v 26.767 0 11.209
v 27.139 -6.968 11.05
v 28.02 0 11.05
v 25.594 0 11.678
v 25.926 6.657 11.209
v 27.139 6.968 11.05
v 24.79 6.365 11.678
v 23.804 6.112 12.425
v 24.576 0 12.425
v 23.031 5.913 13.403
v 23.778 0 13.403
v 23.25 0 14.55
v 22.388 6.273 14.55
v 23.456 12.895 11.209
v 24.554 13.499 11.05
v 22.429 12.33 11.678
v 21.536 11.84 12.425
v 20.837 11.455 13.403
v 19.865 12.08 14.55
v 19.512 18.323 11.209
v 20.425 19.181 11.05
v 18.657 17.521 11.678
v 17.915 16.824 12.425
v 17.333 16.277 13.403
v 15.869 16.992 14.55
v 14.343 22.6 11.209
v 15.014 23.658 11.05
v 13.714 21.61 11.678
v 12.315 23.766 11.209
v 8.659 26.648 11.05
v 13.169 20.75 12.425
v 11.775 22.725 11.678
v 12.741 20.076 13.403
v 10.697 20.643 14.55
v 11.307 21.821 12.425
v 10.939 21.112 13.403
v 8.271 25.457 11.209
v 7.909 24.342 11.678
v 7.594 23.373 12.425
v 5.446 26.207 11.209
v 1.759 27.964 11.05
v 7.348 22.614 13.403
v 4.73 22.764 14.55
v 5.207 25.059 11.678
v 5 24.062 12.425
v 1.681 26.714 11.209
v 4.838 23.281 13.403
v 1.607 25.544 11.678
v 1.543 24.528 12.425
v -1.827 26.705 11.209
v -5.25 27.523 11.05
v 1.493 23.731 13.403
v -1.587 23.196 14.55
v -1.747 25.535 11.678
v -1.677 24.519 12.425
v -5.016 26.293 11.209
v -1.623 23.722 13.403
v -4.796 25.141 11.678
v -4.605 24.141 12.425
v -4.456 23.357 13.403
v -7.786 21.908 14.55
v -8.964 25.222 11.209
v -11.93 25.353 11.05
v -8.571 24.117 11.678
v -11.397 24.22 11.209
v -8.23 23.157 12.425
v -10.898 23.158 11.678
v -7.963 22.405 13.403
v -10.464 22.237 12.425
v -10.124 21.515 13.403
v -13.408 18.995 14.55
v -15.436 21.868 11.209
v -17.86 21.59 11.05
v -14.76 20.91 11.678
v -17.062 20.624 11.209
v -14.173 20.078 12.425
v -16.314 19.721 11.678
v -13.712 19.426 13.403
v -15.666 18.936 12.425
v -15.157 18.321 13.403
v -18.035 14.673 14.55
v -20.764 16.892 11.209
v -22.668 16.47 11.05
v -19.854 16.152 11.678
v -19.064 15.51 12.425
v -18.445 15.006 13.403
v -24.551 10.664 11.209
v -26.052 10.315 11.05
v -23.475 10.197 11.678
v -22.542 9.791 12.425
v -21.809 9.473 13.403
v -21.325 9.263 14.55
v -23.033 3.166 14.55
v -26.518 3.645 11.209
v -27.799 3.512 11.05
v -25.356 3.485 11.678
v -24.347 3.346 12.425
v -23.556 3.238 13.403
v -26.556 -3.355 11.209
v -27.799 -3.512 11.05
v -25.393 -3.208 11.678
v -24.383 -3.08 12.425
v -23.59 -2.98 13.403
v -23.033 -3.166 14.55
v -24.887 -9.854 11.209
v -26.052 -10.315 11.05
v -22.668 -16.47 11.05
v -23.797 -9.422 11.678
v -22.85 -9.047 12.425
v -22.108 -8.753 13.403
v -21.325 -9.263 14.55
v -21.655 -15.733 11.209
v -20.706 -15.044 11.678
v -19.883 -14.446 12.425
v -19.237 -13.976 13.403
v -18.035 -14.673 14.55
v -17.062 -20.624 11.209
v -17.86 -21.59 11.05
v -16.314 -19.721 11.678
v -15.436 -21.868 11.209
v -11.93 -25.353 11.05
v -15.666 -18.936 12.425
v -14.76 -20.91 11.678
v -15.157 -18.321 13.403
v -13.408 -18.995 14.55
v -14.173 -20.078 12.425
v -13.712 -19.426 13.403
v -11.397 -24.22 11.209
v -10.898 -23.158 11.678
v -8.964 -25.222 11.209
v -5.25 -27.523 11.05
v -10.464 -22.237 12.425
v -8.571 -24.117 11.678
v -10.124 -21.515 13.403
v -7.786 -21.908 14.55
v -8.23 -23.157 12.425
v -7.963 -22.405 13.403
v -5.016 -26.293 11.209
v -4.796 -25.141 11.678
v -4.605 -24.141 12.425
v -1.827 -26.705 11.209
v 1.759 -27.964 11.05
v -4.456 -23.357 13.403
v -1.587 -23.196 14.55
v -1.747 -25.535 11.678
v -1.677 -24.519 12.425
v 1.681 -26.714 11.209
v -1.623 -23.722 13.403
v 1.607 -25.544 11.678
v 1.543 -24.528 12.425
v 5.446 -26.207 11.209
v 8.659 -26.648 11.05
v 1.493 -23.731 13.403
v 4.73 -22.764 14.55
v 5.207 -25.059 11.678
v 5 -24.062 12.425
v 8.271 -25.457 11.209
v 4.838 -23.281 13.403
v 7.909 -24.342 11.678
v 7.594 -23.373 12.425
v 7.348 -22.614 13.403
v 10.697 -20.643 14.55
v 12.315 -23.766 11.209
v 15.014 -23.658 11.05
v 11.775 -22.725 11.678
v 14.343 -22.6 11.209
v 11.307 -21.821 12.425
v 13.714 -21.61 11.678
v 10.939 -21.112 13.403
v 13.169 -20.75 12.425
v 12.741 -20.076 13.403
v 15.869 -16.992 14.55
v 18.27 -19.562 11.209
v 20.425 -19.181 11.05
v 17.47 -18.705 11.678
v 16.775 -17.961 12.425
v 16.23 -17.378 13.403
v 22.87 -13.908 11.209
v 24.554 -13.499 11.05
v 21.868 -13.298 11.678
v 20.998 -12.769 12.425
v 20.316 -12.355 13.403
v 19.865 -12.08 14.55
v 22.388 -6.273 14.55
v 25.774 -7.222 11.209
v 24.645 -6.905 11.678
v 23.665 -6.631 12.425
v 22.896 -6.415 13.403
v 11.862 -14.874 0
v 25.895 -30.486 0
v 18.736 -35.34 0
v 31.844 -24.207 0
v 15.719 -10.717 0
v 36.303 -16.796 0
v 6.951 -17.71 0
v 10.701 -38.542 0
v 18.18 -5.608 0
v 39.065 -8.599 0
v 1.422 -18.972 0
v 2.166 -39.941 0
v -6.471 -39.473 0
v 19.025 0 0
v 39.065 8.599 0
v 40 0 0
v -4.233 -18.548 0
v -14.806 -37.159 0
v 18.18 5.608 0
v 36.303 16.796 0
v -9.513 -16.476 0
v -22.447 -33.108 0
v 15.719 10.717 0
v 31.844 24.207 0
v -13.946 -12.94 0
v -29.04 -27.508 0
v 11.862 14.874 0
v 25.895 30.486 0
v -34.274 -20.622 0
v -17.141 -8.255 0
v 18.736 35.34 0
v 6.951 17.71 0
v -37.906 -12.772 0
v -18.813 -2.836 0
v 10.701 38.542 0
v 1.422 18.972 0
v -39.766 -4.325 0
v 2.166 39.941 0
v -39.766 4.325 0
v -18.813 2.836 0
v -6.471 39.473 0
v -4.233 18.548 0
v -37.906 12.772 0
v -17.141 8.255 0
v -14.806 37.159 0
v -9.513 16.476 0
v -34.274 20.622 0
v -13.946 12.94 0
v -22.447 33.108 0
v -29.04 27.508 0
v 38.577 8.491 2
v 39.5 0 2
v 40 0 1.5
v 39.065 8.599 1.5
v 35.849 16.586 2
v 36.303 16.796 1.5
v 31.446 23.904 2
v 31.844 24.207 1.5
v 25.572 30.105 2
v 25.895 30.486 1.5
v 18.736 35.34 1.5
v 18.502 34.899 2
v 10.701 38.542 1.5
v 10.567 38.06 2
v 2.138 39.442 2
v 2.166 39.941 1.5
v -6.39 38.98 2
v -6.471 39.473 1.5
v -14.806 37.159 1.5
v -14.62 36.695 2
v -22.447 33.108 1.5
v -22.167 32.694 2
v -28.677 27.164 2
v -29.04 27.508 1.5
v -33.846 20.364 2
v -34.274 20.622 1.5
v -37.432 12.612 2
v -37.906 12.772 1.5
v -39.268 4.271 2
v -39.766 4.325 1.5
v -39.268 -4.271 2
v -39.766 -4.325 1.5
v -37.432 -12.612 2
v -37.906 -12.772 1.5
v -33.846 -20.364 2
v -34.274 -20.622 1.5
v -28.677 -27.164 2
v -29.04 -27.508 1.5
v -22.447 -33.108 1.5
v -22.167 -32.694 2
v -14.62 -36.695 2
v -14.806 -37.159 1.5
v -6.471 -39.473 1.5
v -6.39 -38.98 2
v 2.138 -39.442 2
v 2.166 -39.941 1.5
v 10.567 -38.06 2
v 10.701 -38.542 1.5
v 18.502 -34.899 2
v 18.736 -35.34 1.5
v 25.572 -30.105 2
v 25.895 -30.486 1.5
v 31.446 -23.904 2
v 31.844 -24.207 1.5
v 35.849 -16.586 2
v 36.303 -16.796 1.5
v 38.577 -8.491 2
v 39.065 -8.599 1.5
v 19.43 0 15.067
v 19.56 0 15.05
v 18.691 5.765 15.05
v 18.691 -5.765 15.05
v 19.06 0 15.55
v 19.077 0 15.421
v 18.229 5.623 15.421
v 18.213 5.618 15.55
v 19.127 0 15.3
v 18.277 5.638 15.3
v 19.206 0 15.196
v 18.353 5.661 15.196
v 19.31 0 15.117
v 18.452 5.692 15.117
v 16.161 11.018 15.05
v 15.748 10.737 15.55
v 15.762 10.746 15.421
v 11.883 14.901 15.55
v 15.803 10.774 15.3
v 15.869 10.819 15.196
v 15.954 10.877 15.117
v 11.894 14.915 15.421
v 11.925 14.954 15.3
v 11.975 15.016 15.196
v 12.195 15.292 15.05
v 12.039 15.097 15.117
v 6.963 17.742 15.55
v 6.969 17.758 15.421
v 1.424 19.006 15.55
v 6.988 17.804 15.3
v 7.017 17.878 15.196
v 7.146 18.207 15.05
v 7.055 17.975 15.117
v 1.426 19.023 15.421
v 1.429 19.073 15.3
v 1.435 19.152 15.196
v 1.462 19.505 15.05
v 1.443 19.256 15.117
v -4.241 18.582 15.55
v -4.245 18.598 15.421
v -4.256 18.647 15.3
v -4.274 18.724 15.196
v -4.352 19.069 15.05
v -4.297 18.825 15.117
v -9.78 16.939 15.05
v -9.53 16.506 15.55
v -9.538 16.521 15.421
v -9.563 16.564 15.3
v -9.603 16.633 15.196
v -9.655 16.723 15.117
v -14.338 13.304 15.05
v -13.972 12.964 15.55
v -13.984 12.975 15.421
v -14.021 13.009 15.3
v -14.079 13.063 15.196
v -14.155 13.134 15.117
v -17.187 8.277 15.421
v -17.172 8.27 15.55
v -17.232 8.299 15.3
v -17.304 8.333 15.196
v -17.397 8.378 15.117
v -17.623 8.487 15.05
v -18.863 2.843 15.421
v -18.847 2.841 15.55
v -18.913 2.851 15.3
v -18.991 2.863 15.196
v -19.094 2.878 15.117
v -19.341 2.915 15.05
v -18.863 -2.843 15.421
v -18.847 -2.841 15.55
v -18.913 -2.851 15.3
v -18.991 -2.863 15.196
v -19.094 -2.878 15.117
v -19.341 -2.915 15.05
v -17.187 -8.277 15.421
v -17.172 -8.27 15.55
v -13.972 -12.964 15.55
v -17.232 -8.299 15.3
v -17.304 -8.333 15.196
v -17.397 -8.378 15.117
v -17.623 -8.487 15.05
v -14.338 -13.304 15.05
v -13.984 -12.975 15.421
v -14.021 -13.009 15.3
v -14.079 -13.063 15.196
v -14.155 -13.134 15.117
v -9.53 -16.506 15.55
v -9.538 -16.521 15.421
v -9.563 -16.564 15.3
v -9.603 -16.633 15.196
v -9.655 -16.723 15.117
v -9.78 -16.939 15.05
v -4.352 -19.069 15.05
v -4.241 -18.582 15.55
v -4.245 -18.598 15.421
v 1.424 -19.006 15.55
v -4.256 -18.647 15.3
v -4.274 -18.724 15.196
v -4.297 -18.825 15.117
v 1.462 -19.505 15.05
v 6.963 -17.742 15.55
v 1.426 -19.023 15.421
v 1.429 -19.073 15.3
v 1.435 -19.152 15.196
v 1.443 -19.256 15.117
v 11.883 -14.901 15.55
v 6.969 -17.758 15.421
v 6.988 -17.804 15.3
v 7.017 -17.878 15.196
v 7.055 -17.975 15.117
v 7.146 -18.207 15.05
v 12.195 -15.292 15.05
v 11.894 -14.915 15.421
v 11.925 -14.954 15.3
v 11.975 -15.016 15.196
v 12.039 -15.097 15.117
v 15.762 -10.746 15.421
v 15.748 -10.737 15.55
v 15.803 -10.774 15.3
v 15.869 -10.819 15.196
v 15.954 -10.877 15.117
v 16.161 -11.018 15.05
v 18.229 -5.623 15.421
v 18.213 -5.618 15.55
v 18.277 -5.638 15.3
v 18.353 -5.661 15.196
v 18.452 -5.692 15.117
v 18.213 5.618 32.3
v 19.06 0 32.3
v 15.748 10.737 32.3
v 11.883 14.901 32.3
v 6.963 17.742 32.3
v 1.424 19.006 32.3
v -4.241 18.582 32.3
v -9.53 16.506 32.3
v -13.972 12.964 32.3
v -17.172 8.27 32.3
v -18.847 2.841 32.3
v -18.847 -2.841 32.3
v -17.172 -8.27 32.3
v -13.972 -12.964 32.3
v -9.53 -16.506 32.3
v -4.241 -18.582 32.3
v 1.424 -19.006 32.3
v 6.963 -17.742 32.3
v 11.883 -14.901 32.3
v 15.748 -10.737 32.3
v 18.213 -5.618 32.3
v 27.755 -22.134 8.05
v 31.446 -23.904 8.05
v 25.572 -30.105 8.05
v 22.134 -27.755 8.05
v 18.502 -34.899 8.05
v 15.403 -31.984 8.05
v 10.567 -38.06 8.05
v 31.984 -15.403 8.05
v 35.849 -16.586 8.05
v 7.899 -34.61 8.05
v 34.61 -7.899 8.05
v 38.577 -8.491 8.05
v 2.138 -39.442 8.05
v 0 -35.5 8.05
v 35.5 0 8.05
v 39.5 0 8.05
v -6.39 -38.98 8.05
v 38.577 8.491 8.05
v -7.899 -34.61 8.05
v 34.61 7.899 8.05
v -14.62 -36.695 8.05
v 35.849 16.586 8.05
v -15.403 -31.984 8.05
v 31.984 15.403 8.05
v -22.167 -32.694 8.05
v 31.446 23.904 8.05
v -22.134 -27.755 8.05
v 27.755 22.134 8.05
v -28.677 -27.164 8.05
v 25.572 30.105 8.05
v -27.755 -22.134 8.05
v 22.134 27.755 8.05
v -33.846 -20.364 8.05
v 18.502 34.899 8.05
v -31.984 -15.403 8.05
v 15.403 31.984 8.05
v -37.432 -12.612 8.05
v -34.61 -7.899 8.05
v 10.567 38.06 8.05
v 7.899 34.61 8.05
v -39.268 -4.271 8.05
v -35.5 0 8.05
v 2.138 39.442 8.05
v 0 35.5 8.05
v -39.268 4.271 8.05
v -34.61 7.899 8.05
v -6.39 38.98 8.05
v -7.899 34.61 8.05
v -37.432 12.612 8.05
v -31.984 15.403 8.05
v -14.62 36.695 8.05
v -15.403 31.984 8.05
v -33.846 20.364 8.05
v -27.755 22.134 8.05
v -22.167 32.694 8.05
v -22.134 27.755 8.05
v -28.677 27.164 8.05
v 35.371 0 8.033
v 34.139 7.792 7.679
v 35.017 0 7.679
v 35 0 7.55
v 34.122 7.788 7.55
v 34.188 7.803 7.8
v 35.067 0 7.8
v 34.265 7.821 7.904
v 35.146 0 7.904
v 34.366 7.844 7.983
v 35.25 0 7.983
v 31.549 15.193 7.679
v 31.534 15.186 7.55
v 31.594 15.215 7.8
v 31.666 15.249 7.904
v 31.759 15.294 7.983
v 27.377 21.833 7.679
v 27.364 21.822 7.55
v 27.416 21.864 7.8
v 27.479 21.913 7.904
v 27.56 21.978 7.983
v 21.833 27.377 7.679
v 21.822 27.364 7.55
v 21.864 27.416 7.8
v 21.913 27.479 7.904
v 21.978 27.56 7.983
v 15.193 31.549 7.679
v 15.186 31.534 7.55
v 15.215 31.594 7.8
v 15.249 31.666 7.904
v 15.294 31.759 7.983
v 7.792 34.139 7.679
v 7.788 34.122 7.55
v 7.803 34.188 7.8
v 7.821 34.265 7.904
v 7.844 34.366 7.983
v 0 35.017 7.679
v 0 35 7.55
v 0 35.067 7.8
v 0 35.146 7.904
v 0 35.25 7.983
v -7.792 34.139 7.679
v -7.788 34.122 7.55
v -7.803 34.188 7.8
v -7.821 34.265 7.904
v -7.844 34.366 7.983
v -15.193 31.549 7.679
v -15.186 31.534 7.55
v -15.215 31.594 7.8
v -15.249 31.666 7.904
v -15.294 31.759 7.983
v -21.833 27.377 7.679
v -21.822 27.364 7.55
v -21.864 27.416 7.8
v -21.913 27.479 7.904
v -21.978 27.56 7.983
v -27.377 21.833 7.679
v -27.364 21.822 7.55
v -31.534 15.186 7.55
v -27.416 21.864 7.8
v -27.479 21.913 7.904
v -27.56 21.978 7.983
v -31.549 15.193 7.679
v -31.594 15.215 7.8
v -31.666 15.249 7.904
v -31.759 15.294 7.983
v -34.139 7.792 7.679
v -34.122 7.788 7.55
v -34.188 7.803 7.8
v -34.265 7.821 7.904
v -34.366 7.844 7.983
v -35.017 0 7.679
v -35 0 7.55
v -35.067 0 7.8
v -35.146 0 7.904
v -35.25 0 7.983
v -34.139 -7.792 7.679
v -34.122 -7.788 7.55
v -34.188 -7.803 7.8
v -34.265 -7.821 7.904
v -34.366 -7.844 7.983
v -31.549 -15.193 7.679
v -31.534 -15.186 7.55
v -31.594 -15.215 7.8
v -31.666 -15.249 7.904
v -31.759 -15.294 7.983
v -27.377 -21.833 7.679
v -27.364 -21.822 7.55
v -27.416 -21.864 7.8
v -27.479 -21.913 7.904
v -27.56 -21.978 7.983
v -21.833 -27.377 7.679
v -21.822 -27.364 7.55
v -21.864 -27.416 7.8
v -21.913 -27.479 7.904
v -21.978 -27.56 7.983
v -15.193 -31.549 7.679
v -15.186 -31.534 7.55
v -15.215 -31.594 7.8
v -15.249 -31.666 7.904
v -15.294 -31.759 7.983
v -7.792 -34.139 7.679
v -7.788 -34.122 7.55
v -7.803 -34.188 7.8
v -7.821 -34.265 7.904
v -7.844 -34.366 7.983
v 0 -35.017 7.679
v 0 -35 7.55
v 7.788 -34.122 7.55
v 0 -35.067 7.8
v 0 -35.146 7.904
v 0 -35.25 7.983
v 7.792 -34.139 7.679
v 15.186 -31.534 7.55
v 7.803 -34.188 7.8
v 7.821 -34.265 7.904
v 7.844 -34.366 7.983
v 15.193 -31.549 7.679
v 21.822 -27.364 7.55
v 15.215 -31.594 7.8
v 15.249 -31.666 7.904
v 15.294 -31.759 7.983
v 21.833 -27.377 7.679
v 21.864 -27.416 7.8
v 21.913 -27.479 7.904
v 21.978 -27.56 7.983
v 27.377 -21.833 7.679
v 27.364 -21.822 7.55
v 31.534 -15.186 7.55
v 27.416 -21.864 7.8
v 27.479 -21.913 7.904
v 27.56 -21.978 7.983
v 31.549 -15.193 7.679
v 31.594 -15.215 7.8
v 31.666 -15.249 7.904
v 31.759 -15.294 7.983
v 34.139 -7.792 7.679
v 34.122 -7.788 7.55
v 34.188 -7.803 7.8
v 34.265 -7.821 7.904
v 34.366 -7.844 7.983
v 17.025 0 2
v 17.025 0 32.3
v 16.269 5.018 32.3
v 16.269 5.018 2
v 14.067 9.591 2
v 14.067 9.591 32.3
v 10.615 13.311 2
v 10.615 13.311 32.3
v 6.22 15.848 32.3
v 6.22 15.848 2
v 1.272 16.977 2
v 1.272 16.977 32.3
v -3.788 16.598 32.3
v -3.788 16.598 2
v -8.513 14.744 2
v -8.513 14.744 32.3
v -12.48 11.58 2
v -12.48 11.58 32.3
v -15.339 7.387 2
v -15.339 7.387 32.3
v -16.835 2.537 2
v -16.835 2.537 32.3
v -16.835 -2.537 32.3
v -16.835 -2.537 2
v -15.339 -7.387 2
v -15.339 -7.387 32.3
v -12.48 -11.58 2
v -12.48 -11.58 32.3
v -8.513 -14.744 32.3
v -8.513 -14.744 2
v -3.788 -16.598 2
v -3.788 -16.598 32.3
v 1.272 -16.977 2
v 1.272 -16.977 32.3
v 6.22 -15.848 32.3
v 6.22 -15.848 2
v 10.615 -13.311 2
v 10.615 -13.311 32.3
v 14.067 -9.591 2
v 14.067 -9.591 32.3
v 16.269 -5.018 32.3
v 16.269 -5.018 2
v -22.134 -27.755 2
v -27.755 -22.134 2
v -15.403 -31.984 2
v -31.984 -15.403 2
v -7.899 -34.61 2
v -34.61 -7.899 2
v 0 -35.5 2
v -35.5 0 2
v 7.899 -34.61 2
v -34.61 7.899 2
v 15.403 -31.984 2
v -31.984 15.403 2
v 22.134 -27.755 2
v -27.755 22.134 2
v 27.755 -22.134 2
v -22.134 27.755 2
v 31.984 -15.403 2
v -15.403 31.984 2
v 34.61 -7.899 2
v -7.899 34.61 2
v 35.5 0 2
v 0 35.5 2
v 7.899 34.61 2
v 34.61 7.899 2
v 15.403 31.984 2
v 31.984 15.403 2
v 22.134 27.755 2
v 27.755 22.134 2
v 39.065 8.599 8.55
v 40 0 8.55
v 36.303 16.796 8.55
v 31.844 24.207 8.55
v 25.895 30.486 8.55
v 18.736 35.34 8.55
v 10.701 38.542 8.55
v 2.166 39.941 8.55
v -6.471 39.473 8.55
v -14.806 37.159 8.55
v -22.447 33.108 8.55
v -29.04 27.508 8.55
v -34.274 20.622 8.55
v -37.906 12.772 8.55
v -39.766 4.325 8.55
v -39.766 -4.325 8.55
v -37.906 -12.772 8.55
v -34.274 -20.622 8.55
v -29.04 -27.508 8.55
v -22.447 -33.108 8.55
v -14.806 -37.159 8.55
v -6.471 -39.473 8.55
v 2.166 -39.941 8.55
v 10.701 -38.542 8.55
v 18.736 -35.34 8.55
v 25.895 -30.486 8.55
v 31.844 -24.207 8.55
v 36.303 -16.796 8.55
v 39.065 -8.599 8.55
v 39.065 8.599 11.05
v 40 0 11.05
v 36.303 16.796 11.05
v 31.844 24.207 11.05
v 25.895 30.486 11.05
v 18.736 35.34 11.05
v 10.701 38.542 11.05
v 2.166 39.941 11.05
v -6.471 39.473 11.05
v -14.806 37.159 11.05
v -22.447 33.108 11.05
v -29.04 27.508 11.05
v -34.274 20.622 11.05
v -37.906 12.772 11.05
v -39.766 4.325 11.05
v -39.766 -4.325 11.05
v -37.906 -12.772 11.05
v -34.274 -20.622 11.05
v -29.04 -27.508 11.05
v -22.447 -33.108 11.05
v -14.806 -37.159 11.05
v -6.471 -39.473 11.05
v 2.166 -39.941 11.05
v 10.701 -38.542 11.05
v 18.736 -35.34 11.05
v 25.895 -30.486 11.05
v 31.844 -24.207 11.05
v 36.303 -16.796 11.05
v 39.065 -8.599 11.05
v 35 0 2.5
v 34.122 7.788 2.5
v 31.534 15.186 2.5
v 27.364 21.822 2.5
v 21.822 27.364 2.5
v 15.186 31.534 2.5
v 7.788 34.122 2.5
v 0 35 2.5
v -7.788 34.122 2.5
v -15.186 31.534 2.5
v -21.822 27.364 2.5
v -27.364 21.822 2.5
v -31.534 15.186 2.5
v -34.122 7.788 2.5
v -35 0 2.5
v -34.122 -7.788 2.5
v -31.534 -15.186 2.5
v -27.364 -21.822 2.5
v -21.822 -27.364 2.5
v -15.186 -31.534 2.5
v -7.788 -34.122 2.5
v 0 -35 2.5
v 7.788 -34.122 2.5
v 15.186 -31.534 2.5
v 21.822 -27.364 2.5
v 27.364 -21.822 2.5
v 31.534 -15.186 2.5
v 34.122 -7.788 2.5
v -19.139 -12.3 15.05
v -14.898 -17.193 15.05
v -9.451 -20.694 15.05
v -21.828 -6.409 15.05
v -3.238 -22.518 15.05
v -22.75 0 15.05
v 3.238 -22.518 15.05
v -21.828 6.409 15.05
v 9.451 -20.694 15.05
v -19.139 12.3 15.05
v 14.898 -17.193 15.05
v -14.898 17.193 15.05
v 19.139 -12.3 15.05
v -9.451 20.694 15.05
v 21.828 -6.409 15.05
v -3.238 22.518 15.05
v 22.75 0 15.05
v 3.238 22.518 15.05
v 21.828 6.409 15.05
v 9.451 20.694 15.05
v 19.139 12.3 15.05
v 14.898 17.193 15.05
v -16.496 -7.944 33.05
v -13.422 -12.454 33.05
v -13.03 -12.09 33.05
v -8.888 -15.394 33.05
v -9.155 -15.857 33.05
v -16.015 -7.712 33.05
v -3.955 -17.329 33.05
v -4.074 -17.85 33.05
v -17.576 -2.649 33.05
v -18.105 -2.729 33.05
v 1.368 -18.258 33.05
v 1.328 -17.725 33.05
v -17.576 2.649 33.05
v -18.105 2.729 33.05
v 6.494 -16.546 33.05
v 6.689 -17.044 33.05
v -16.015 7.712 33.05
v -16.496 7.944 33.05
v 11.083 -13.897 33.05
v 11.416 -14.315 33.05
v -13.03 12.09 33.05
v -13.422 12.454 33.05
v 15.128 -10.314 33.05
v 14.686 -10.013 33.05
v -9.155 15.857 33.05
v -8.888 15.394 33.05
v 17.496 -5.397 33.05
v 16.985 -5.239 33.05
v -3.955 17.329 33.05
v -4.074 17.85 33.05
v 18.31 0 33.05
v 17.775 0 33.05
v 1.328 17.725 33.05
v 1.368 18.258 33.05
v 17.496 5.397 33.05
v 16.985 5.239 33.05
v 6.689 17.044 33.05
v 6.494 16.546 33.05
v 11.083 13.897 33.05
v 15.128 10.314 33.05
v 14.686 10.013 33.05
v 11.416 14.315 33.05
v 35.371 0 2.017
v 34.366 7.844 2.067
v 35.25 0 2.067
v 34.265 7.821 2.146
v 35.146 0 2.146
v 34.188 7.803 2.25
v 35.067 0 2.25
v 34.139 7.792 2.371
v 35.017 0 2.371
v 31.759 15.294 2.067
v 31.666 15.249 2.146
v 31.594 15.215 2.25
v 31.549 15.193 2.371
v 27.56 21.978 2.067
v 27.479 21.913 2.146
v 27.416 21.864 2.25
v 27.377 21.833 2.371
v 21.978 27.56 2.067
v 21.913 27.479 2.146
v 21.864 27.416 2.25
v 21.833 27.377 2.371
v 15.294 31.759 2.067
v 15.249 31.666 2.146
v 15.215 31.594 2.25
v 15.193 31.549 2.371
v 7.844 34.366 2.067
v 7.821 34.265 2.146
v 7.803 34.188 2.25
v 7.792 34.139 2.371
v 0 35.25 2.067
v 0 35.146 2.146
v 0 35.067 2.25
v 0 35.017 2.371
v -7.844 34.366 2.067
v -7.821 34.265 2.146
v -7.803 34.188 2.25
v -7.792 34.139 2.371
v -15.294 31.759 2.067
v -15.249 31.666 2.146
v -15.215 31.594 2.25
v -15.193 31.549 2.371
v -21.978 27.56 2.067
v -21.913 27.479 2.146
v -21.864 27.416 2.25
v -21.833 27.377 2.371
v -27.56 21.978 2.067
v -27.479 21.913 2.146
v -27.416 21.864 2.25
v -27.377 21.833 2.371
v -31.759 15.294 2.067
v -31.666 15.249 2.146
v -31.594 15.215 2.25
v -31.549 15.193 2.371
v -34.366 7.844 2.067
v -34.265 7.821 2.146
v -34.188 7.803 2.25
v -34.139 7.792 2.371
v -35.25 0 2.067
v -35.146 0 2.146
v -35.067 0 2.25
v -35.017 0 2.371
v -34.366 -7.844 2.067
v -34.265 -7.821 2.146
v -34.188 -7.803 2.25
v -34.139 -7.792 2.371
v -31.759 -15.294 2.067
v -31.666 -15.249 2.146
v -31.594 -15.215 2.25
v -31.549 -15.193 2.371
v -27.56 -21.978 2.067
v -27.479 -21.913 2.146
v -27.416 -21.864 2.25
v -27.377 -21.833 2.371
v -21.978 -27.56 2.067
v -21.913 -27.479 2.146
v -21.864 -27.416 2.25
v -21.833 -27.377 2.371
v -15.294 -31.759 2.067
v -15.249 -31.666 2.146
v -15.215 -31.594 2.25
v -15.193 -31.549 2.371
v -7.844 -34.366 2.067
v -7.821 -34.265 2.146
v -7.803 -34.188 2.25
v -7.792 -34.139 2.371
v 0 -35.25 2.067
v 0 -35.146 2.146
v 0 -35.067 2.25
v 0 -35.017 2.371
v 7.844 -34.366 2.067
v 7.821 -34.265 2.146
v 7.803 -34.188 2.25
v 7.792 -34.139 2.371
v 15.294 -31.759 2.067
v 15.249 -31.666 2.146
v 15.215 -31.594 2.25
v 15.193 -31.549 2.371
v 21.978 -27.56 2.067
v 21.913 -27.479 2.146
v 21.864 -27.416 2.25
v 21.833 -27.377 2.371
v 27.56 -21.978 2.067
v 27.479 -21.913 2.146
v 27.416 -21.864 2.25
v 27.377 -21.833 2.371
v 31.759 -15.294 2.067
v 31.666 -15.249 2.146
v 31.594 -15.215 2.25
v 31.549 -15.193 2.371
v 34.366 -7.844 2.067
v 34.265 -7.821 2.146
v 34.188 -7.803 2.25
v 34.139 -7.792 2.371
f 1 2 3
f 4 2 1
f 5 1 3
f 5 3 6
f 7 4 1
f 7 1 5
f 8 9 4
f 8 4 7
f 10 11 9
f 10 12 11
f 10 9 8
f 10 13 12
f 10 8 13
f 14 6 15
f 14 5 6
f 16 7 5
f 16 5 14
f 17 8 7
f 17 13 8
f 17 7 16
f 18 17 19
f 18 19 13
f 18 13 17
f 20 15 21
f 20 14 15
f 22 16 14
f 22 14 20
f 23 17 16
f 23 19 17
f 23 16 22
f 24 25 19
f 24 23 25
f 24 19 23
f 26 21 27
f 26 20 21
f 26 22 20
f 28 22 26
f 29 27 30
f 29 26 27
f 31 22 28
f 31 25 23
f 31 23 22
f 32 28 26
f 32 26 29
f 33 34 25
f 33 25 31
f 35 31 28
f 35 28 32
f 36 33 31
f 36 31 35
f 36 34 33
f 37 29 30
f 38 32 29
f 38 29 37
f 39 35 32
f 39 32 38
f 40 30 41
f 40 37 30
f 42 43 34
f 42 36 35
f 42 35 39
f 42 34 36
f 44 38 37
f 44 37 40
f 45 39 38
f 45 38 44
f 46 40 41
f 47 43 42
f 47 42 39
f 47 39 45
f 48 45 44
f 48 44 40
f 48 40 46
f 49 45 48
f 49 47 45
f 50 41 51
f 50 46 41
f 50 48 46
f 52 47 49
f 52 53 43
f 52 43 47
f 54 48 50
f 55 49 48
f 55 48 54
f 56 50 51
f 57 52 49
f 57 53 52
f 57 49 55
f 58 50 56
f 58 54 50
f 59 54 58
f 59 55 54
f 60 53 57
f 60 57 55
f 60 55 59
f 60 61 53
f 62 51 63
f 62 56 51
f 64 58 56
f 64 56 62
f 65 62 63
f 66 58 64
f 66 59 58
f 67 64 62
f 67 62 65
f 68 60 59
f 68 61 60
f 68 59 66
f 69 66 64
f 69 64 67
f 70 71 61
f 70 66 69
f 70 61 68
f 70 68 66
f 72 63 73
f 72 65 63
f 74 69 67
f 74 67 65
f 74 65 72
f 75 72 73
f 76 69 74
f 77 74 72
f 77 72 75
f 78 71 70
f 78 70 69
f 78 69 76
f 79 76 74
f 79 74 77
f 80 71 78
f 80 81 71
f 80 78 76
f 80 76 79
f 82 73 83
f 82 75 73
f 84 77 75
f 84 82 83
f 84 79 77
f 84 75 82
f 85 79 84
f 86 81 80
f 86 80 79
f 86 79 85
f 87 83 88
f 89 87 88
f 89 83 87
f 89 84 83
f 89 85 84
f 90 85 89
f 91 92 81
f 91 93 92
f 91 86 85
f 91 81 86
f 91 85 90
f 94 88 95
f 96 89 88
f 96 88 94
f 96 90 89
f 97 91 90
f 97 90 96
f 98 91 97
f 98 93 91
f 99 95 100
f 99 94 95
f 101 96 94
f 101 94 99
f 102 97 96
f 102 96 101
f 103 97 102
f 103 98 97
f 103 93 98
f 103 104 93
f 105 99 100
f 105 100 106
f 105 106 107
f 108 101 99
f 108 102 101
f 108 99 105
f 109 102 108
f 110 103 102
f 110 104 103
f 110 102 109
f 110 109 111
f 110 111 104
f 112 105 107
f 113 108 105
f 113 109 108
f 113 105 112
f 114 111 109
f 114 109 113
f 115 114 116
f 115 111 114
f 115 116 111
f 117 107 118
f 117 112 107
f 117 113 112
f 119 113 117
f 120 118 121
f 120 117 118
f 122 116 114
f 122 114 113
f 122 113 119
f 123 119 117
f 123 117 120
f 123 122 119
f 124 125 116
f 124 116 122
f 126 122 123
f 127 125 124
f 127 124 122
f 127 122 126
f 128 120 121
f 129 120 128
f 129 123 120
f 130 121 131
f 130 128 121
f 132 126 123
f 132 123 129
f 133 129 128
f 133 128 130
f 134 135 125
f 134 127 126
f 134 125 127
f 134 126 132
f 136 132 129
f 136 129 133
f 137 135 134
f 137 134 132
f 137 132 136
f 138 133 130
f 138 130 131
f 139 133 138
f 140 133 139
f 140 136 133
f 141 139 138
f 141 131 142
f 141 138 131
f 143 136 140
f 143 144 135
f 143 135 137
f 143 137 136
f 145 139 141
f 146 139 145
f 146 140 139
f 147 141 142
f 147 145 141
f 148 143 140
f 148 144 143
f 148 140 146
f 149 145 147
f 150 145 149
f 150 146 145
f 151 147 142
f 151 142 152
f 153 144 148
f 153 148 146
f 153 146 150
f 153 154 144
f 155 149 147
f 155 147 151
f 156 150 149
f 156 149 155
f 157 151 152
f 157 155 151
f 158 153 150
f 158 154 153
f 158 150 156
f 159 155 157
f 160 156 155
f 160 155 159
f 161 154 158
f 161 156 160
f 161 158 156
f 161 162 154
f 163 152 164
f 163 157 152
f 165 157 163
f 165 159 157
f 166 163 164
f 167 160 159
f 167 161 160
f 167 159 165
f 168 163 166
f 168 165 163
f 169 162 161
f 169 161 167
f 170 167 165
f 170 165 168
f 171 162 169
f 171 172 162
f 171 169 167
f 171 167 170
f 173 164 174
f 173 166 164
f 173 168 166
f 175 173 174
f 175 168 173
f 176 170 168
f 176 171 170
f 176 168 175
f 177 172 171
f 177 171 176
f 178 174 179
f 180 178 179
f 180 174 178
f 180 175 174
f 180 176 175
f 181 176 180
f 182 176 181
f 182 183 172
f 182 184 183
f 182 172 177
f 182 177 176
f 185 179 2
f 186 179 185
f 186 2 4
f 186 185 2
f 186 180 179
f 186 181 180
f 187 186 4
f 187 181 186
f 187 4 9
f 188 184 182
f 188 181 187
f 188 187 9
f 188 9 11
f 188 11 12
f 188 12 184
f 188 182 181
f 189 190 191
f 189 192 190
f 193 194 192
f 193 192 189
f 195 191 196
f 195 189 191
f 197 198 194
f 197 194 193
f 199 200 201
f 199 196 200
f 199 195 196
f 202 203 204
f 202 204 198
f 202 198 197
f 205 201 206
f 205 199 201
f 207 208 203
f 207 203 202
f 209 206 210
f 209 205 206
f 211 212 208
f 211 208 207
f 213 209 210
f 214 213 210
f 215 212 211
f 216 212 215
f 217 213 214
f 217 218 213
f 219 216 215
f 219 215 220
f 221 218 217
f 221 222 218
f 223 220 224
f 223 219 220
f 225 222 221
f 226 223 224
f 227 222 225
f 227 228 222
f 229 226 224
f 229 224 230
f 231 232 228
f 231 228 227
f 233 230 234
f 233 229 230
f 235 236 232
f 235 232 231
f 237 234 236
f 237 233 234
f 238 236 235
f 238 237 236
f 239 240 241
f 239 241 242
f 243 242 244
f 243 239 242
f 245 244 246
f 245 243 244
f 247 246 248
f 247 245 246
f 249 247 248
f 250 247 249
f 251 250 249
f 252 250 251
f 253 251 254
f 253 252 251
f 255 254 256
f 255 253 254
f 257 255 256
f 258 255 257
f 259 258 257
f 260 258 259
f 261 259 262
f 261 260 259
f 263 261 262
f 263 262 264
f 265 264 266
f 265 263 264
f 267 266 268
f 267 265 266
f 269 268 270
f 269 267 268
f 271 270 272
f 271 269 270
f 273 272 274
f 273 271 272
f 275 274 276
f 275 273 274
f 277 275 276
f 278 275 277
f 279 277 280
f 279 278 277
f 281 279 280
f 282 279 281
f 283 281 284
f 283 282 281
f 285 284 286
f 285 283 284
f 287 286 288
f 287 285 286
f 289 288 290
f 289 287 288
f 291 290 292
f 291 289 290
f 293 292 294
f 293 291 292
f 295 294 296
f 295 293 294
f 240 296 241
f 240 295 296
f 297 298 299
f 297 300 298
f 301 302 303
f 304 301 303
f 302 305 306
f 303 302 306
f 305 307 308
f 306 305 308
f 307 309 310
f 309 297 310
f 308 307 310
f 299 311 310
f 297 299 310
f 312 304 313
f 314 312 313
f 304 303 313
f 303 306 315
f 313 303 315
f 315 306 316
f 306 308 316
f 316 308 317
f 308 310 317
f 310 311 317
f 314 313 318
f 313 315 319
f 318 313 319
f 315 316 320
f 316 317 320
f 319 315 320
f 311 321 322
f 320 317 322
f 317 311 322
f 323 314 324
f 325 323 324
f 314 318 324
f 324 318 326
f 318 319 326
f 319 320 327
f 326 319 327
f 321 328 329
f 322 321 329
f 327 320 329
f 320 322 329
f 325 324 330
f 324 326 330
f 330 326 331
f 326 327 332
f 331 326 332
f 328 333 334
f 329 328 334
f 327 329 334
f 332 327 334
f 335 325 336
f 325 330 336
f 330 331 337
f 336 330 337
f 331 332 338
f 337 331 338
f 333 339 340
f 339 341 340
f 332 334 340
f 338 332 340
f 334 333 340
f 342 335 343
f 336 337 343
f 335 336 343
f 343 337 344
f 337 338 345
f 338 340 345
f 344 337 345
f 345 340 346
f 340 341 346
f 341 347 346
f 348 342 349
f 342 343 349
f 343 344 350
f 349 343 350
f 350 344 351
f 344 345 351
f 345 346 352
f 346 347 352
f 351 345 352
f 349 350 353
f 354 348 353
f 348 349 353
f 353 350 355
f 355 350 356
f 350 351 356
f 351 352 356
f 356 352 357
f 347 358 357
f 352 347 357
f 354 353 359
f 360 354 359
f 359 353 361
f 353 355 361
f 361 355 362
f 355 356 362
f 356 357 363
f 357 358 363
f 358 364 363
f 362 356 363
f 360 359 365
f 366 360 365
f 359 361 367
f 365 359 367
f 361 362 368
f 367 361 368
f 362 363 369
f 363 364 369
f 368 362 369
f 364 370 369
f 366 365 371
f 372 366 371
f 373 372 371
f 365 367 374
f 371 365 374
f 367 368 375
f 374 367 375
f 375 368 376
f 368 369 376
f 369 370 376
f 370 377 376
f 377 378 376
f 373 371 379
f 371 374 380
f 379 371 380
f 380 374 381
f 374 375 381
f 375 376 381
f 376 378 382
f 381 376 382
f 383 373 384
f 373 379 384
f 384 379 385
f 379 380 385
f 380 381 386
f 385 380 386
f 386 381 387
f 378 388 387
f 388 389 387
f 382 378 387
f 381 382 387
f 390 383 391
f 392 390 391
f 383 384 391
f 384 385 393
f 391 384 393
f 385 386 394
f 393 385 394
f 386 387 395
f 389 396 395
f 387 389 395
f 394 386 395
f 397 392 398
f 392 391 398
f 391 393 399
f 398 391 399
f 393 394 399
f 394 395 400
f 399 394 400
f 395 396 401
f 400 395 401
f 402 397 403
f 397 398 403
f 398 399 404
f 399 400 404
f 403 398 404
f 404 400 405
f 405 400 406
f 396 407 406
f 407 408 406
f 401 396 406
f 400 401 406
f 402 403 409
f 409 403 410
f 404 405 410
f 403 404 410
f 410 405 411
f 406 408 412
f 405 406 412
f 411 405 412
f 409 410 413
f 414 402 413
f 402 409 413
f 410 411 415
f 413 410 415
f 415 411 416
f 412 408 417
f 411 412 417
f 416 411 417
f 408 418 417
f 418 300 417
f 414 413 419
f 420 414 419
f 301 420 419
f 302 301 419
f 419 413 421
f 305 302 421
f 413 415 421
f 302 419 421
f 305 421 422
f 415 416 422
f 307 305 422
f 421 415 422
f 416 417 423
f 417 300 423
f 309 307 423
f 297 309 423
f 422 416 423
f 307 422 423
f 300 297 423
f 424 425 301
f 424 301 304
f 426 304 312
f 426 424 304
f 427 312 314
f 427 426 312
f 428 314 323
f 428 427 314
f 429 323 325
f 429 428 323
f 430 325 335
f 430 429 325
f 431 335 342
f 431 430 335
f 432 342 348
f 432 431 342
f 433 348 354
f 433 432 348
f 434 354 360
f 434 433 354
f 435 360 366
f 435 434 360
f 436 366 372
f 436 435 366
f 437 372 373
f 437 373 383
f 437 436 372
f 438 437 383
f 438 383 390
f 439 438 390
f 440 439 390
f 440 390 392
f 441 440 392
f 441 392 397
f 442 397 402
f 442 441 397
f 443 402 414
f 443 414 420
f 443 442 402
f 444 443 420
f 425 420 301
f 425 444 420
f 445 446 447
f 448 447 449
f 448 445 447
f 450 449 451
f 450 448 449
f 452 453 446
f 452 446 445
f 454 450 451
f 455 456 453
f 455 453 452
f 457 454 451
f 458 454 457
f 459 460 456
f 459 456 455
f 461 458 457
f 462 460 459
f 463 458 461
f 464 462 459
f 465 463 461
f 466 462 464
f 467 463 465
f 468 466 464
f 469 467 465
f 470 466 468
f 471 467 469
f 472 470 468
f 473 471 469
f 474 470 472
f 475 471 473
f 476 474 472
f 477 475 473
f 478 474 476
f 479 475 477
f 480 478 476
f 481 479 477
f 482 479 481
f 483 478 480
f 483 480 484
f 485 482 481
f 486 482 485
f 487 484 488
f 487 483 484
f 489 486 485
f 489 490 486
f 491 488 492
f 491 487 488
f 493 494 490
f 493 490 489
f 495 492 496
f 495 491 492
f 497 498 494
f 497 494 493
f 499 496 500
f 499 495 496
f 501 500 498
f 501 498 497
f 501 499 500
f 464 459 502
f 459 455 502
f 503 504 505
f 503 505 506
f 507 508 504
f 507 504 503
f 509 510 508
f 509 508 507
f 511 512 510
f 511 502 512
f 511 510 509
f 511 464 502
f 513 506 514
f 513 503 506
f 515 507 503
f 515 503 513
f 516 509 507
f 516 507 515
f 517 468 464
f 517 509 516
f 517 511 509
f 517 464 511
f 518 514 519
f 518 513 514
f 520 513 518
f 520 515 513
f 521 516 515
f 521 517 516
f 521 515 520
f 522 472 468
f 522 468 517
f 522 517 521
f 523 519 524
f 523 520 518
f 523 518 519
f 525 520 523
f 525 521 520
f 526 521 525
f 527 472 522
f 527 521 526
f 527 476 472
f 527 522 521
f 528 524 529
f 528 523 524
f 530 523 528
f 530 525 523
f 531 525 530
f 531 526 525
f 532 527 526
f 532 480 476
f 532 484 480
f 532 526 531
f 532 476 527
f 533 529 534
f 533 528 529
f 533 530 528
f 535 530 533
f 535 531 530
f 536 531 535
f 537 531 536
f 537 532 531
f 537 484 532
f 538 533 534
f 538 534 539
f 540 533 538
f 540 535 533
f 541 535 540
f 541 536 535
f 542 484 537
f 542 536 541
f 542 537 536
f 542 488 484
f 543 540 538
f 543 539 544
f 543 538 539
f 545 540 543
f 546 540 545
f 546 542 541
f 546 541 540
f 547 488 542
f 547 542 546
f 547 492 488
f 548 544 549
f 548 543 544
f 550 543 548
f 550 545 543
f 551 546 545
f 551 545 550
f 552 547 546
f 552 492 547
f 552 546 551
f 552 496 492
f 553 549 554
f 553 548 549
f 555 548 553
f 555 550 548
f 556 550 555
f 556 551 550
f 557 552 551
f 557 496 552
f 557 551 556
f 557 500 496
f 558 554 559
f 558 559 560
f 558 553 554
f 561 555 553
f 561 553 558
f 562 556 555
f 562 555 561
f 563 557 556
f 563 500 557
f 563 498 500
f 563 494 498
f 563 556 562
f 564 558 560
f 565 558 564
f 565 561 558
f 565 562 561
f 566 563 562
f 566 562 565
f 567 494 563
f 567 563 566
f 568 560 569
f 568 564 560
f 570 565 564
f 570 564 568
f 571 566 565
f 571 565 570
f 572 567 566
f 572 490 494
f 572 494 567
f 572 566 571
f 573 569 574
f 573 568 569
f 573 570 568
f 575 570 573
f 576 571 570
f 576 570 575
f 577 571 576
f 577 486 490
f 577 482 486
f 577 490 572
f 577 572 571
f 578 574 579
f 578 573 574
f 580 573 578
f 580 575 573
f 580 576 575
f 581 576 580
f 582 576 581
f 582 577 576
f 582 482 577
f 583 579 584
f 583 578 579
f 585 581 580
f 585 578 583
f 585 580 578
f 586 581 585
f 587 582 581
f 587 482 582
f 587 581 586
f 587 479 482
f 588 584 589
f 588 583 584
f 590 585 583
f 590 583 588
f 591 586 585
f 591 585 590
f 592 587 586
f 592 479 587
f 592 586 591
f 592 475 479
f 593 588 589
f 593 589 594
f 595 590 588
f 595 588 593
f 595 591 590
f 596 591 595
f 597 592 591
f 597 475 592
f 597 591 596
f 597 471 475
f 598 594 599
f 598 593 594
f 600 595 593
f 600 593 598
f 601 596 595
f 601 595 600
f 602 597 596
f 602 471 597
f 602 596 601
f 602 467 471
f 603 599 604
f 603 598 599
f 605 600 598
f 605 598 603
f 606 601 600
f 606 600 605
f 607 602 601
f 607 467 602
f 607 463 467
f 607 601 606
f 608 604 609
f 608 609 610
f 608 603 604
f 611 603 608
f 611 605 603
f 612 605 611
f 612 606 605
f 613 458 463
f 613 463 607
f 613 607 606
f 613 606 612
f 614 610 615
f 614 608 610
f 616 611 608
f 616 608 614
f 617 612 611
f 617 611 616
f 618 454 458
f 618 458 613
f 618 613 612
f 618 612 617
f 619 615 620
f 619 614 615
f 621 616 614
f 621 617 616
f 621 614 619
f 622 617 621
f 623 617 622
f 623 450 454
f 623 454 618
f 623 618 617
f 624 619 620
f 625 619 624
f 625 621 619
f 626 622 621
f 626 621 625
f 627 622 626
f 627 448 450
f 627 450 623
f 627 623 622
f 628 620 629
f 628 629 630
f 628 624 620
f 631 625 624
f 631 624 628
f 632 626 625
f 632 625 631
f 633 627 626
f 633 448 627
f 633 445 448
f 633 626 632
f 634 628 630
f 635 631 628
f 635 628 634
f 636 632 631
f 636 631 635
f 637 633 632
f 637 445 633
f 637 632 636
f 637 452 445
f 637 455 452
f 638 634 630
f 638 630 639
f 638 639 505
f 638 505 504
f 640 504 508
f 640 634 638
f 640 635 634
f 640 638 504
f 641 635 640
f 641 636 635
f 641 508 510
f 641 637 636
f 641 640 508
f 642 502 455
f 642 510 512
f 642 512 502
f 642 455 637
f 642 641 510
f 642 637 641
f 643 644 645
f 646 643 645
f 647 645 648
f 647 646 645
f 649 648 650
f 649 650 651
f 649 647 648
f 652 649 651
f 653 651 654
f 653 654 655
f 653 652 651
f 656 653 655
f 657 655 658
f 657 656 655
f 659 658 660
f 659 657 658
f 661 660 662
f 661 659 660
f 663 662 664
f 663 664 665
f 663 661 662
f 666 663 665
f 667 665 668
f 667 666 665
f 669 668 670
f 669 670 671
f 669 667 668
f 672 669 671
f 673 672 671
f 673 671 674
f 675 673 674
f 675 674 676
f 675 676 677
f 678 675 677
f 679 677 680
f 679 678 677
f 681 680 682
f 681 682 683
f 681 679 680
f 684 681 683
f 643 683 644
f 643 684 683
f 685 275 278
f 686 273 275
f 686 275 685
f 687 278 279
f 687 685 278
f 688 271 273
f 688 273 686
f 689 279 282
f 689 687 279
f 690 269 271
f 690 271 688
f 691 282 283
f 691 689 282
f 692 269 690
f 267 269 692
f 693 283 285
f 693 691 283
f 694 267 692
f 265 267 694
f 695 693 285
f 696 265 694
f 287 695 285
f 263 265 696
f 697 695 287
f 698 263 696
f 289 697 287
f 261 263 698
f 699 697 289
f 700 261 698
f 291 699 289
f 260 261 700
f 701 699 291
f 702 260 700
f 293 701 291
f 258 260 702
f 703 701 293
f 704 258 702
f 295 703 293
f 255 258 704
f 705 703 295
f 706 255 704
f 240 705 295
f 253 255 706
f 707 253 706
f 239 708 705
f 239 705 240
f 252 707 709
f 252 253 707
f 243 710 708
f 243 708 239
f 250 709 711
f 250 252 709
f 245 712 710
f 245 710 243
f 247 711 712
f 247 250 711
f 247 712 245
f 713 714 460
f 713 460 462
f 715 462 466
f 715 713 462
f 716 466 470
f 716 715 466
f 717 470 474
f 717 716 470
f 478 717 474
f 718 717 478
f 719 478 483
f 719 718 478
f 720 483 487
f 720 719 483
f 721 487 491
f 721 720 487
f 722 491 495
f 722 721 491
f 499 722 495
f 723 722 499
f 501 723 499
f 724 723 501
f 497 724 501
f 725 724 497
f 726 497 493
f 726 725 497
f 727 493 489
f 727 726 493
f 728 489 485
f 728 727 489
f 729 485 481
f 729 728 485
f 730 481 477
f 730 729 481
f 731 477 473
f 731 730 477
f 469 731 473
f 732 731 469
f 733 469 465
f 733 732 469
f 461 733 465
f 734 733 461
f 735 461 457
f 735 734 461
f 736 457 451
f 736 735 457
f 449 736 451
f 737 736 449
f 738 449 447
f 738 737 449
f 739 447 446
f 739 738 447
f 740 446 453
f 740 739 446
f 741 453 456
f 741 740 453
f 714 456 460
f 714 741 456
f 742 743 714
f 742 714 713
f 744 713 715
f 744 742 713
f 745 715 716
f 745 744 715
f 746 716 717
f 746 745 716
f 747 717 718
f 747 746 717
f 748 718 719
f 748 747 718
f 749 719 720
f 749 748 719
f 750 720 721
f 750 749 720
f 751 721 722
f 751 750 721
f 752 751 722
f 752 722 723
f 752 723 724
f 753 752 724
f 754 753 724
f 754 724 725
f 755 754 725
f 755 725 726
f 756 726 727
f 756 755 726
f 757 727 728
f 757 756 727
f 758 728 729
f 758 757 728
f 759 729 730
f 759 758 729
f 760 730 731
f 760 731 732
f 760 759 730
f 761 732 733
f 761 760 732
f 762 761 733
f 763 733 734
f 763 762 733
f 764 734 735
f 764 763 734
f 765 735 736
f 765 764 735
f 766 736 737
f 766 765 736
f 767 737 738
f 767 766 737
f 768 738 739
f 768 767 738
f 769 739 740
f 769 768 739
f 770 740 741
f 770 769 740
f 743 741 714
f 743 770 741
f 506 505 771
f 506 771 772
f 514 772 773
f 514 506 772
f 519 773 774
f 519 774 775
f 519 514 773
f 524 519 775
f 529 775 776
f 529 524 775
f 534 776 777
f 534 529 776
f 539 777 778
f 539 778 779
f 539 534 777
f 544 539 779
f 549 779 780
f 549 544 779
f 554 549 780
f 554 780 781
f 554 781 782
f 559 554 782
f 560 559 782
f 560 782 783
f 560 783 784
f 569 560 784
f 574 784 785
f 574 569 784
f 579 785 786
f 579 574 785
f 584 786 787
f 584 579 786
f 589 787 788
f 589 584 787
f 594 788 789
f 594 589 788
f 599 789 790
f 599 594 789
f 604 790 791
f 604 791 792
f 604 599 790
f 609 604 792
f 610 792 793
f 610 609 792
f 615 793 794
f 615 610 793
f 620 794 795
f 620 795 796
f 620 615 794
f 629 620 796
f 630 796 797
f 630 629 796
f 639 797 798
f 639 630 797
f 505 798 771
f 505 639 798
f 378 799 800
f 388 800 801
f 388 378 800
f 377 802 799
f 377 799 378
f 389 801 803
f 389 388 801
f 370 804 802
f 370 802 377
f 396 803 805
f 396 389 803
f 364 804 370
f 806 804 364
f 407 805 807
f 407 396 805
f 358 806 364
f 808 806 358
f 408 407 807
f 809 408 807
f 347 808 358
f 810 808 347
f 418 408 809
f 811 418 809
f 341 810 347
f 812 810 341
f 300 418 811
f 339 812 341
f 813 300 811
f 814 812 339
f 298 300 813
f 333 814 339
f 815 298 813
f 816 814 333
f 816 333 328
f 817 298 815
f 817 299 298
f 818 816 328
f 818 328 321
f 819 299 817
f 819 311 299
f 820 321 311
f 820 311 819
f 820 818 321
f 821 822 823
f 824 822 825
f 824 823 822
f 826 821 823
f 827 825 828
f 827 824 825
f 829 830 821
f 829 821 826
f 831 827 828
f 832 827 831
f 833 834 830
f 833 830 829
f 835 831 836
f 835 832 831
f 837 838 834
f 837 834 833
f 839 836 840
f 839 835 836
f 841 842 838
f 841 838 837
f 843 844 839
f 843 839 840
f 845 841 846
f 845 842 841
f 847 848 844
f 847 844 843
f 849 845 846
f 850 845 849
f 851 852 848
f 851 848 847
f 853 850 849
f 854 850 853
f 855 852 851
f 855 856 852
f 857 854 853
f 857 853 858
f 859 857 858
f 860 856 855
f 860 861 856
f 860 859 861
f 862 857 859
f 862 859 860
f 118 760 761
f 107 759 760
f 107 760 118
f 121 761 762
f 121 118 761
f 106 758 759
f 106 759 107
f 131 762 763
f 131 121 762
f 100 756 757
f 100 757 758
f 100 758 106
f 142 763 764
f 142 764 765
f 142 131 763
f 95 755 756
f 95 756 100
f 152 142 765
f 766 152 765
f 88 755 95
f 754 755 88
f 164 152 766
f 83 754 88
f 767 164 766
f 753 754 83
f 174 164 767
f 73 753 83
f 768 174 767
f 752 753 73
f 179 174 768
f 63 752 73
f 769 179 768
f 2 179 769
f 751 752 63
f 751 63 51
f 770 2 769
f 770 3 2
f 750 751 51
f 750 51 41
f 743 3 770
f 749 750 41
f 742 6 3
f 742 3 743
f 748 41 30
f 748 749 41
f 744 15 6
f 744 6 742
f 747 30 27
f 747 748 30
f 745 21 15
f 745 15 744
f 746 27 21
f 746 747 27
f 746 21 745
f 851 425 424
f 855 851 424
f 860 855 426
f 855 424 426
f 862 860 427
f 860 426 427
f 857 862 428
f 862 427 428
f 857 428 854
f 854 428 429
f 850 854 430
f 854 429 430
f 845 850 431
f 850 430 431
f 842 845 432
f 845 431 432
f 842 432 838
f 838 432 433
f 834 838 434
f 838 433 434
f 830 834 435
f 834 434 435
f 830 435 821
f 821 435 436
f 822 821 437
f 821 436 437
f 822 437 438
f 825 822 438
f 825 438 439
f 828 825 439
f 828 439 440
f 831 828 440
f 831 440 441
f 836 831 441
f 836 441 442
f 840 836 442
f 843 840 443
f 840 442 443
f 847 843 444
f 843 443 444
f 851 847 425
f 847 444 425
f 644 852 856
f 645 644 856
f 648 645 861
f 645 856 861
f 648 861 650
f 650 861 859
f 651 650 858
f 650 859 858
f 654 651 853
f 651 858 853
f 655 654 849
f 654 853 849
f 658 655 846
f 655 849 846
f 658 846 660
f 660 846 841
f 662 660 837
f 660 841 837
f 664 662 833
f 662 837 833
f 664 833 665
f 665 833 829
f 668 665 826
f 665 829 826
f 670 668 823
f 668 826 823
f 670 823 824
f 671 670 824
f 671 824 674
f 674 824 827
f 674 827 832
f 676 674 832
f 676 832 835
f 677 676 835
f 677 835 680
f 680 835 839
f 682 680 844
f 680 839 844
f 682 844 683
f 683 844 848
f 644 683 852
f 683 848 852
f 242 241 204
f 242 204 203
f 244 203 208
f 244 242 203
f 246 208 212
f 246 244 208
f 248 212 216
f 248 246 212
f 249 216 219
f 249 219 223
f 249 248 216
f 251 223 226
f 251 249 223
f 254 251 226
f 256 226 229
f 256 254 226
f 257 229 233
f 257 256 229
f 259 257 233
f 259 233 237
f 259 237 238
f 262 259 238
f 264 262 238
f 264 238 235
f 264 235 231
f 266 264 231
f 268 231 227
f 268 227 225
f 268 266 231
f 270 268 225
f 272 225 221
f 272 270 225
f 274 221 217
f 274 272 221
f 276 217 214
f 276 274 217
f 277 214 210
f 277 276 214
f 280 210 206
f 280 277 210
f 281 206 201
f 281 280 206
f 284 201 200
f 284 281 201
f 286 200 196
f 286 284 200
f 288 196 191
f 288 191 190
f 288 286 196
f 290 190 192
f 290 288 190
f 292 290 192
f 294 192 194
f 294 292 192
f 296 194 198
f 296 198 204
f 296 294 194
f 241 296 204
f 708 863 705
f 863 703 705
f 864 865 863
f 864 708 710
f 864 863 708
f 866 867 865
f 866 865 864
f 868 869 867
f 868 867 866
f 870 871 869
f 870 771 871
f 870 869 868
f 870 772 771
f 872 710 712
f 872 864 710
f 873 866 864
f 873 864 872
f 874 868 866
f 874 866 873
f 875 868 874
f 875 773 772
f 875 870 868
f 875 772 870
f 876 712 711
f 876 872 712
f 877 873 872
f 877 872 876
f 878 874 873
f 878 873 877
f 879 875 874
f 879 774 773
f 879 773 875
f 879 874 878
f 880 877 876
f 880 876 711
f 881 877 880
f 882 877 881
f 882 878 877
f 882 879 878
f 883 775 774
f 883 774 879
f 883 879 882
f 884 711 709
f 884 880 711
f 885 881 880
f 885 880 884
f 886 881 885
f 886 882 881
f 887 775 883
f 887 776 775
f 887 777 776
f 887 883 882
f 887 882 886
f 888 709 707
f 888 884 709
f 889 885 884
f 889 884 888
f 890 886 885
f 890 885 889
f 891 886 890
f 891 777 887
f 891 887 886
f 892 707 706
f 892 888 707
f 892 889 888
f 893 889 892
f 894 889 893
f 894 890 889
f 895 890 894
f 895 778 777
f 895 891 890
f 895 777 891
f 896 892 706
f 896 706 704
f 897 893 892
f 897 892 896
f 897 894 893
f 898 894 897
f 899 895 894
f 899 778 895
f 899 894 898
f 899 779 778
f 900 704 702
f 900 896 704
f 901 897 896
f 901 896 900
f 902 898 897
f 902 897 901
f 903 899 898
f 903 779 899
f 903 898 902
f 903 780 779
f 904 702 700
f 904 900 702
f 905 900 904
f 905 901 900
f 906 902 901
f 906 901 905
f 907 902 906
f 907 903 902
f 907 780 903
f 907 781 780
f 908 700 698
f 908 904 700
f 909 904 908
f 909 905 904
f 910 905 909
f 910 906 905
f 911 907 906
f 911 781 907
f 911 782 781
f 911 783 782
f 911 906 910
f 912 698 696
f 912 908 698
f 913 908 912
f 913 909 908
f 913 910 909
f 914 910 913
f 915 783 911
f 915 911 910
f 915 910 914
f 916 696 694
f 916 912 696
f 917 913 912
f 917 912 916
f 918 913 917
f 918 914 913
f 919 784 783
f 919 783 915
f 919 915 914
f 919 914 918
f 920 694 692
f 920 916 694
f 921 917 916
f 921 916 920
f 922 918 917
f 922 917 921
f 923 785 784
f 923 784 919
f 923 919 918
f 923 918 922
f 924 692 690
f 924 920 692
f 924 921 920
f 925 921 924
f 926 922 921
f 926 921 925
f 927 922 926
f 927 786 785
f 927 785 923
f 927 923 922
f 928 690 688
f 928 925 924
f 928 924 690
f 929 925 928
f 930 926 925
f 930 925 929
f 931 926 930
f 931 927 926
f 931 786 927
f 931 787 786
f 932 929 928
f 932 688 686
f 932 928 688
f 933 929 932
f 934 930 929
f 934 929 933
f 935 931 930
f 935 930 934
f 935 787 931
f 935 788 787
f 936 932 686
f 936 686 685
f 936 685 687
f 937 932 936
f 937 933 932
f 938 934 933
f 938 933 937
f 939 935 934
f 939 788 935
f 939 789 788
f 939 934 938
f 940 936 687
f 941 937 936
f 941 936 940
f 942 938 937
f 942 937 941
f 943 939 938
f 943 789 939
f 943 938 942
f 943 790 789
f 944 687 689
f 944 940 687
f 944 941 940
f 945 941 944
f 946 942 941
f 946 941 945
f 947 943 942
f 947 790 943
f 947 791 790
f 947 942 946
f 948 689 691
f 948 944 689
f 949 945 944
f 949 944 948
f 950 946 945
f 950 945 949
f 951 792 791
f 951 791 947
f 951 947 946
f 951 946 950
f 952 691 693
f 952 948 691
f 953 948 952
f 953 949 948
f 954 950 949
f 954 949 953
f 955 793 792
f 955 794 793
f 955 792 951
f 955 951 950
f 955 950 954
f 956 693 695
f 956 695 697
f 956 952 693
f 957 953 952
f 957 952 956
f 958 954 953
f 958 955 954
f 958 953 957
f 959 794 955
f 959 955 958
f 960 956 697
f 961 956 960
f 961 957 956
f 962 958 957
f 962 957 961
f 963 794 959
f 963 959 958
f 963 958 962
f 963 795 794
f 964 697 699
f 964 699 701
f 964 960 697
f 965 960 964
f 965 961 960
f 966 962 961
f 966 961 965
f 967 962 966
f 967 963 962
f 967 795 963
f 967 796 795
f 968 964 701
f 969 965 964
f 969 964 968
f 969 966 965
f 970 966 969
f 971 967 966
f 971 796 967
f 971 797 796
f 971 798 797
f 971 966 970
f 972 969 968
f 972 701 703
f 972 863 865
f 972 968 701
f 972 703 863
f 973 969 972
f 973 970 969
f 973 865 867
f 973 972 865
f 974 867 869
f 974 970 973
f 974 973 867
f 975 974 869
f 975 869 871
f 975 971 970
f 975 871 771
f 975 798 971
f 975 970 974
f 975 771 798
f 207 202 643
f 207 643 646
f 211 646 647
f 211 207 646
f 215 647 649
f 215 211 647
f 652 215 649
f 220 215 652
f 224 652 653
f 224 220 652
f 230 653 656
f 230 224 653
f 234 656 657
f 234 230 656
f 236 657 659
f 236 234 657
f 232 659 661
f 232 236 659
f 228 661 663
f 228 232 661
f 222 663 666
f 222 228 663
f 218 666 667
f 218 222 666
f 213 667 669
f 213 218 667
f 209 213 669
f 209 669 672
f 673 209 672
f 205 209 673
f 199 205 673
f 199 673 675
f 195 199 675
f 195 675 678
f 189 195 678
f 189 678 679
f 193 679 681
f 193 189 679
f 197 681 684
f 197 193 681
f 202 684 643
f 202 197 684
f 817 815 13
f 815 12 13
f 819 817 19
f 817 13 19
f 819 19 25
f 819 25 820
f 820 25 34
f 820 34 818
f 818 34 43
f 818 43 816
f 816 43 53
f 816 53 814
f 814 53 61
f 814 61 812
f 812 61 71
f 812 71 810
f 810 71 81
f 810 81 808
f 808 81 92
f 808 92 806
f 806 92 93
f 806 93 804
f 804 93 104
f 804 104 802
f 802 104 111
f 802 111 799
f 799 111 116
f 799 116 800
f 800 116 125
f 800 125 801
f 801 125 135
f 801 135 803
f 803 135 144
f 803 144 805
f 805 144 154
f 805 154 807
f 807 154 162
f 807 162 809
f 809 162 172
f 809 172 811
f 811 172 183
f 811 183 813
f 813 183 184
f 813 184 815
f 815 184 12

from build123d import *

# Parameters (mm, degrees)
F2_SIZE = 2
F3_SIZE = 0.75
F4_SIZE = 0.5
F5_R    = 0.5


# Not quite as in the source:
# - a fillet or chamfer that OpenCascade refuses, or shapes differently, is made with other operations: its cross-section is extruded or revolved along the edge and cut away or added


with BuildPart() as f1:
    # F0 (on Front) → F1 (revolve)
    with BuildSketch(Plane.XZ):
        Polygon((17.025, 33.05), (17.025, 0), (40, 0), (40, 2), (35, 2), (35, 8.05), (40, 8.05), (40, 11.05), (23.25, 11.05), (23.25, 15.05), (19.059525, 15.05), (19.059525, 33.05), align=None)
    revolve(axis=Axis((0, 0, 13.9434672892), (0, 0, 1)))

    # F2
    f2_edges = [f1.edges().sort_by_distance(p)[0] for p in [
        (-17.025, 0, 0),
    ]]
    chamfer(f2_edges, length=F2_SIZE)

    # F3
    f3_edges = [f1.edges().sort_by_distance(p)[0] for p in [
        (-17.025, 0, 33.05),
        (-19.059525, 0, 33.05),
    ]]
    chamfer(f3_edges, length=F3_SIZE)

    # F4
    f4_edges = [f1.edges().sort_by_distance(p)[0] for p in [
        (-23.25, 0, 15.05),
        (-40, 0, 8.05),
        (-40, 0, 2),
    ]]
    chamfer(f4_edges, length=F4_SIZE)

    # F5
    f5_edges = [f1.edges().sort_by_distance(p)[0] for p in [
        (-35, 0, 8.05),
        (-35, 0, 2),
        (-19.059525, 0, 15.05),
    ]]
    fillet(f5_edges, radius=F5_R)

    # F6: fillet of radius 5 on 1 edges, made by hand

    # F6_s1 → F6_t2 (revolve)
    with BuildSketch(Plane.XZ):
        with BuildLine():
            ThreePointArc((28.0196960071, 11.05), (25.0616561155, 12.0188711259), (23.25, 14.55))
            Line((23.25, 14.55), (23.1546060799, 14.52))
            ThreePointArc((23.1546060799, 14.52), (23.15, 12.8), (23.15, 11.05))
            Line((23.15, 11.05), (23.25, 10.95))
            Line((23.25, 10.95), (28.0196960071, 10.95))
            Line((28.0196960071, 10.95), (28.0196960071, 11.05))
        make_face()
    revolve(axis=Axis((0, 0, 11.05), (0, 0, 1)))


solid = f1.part
